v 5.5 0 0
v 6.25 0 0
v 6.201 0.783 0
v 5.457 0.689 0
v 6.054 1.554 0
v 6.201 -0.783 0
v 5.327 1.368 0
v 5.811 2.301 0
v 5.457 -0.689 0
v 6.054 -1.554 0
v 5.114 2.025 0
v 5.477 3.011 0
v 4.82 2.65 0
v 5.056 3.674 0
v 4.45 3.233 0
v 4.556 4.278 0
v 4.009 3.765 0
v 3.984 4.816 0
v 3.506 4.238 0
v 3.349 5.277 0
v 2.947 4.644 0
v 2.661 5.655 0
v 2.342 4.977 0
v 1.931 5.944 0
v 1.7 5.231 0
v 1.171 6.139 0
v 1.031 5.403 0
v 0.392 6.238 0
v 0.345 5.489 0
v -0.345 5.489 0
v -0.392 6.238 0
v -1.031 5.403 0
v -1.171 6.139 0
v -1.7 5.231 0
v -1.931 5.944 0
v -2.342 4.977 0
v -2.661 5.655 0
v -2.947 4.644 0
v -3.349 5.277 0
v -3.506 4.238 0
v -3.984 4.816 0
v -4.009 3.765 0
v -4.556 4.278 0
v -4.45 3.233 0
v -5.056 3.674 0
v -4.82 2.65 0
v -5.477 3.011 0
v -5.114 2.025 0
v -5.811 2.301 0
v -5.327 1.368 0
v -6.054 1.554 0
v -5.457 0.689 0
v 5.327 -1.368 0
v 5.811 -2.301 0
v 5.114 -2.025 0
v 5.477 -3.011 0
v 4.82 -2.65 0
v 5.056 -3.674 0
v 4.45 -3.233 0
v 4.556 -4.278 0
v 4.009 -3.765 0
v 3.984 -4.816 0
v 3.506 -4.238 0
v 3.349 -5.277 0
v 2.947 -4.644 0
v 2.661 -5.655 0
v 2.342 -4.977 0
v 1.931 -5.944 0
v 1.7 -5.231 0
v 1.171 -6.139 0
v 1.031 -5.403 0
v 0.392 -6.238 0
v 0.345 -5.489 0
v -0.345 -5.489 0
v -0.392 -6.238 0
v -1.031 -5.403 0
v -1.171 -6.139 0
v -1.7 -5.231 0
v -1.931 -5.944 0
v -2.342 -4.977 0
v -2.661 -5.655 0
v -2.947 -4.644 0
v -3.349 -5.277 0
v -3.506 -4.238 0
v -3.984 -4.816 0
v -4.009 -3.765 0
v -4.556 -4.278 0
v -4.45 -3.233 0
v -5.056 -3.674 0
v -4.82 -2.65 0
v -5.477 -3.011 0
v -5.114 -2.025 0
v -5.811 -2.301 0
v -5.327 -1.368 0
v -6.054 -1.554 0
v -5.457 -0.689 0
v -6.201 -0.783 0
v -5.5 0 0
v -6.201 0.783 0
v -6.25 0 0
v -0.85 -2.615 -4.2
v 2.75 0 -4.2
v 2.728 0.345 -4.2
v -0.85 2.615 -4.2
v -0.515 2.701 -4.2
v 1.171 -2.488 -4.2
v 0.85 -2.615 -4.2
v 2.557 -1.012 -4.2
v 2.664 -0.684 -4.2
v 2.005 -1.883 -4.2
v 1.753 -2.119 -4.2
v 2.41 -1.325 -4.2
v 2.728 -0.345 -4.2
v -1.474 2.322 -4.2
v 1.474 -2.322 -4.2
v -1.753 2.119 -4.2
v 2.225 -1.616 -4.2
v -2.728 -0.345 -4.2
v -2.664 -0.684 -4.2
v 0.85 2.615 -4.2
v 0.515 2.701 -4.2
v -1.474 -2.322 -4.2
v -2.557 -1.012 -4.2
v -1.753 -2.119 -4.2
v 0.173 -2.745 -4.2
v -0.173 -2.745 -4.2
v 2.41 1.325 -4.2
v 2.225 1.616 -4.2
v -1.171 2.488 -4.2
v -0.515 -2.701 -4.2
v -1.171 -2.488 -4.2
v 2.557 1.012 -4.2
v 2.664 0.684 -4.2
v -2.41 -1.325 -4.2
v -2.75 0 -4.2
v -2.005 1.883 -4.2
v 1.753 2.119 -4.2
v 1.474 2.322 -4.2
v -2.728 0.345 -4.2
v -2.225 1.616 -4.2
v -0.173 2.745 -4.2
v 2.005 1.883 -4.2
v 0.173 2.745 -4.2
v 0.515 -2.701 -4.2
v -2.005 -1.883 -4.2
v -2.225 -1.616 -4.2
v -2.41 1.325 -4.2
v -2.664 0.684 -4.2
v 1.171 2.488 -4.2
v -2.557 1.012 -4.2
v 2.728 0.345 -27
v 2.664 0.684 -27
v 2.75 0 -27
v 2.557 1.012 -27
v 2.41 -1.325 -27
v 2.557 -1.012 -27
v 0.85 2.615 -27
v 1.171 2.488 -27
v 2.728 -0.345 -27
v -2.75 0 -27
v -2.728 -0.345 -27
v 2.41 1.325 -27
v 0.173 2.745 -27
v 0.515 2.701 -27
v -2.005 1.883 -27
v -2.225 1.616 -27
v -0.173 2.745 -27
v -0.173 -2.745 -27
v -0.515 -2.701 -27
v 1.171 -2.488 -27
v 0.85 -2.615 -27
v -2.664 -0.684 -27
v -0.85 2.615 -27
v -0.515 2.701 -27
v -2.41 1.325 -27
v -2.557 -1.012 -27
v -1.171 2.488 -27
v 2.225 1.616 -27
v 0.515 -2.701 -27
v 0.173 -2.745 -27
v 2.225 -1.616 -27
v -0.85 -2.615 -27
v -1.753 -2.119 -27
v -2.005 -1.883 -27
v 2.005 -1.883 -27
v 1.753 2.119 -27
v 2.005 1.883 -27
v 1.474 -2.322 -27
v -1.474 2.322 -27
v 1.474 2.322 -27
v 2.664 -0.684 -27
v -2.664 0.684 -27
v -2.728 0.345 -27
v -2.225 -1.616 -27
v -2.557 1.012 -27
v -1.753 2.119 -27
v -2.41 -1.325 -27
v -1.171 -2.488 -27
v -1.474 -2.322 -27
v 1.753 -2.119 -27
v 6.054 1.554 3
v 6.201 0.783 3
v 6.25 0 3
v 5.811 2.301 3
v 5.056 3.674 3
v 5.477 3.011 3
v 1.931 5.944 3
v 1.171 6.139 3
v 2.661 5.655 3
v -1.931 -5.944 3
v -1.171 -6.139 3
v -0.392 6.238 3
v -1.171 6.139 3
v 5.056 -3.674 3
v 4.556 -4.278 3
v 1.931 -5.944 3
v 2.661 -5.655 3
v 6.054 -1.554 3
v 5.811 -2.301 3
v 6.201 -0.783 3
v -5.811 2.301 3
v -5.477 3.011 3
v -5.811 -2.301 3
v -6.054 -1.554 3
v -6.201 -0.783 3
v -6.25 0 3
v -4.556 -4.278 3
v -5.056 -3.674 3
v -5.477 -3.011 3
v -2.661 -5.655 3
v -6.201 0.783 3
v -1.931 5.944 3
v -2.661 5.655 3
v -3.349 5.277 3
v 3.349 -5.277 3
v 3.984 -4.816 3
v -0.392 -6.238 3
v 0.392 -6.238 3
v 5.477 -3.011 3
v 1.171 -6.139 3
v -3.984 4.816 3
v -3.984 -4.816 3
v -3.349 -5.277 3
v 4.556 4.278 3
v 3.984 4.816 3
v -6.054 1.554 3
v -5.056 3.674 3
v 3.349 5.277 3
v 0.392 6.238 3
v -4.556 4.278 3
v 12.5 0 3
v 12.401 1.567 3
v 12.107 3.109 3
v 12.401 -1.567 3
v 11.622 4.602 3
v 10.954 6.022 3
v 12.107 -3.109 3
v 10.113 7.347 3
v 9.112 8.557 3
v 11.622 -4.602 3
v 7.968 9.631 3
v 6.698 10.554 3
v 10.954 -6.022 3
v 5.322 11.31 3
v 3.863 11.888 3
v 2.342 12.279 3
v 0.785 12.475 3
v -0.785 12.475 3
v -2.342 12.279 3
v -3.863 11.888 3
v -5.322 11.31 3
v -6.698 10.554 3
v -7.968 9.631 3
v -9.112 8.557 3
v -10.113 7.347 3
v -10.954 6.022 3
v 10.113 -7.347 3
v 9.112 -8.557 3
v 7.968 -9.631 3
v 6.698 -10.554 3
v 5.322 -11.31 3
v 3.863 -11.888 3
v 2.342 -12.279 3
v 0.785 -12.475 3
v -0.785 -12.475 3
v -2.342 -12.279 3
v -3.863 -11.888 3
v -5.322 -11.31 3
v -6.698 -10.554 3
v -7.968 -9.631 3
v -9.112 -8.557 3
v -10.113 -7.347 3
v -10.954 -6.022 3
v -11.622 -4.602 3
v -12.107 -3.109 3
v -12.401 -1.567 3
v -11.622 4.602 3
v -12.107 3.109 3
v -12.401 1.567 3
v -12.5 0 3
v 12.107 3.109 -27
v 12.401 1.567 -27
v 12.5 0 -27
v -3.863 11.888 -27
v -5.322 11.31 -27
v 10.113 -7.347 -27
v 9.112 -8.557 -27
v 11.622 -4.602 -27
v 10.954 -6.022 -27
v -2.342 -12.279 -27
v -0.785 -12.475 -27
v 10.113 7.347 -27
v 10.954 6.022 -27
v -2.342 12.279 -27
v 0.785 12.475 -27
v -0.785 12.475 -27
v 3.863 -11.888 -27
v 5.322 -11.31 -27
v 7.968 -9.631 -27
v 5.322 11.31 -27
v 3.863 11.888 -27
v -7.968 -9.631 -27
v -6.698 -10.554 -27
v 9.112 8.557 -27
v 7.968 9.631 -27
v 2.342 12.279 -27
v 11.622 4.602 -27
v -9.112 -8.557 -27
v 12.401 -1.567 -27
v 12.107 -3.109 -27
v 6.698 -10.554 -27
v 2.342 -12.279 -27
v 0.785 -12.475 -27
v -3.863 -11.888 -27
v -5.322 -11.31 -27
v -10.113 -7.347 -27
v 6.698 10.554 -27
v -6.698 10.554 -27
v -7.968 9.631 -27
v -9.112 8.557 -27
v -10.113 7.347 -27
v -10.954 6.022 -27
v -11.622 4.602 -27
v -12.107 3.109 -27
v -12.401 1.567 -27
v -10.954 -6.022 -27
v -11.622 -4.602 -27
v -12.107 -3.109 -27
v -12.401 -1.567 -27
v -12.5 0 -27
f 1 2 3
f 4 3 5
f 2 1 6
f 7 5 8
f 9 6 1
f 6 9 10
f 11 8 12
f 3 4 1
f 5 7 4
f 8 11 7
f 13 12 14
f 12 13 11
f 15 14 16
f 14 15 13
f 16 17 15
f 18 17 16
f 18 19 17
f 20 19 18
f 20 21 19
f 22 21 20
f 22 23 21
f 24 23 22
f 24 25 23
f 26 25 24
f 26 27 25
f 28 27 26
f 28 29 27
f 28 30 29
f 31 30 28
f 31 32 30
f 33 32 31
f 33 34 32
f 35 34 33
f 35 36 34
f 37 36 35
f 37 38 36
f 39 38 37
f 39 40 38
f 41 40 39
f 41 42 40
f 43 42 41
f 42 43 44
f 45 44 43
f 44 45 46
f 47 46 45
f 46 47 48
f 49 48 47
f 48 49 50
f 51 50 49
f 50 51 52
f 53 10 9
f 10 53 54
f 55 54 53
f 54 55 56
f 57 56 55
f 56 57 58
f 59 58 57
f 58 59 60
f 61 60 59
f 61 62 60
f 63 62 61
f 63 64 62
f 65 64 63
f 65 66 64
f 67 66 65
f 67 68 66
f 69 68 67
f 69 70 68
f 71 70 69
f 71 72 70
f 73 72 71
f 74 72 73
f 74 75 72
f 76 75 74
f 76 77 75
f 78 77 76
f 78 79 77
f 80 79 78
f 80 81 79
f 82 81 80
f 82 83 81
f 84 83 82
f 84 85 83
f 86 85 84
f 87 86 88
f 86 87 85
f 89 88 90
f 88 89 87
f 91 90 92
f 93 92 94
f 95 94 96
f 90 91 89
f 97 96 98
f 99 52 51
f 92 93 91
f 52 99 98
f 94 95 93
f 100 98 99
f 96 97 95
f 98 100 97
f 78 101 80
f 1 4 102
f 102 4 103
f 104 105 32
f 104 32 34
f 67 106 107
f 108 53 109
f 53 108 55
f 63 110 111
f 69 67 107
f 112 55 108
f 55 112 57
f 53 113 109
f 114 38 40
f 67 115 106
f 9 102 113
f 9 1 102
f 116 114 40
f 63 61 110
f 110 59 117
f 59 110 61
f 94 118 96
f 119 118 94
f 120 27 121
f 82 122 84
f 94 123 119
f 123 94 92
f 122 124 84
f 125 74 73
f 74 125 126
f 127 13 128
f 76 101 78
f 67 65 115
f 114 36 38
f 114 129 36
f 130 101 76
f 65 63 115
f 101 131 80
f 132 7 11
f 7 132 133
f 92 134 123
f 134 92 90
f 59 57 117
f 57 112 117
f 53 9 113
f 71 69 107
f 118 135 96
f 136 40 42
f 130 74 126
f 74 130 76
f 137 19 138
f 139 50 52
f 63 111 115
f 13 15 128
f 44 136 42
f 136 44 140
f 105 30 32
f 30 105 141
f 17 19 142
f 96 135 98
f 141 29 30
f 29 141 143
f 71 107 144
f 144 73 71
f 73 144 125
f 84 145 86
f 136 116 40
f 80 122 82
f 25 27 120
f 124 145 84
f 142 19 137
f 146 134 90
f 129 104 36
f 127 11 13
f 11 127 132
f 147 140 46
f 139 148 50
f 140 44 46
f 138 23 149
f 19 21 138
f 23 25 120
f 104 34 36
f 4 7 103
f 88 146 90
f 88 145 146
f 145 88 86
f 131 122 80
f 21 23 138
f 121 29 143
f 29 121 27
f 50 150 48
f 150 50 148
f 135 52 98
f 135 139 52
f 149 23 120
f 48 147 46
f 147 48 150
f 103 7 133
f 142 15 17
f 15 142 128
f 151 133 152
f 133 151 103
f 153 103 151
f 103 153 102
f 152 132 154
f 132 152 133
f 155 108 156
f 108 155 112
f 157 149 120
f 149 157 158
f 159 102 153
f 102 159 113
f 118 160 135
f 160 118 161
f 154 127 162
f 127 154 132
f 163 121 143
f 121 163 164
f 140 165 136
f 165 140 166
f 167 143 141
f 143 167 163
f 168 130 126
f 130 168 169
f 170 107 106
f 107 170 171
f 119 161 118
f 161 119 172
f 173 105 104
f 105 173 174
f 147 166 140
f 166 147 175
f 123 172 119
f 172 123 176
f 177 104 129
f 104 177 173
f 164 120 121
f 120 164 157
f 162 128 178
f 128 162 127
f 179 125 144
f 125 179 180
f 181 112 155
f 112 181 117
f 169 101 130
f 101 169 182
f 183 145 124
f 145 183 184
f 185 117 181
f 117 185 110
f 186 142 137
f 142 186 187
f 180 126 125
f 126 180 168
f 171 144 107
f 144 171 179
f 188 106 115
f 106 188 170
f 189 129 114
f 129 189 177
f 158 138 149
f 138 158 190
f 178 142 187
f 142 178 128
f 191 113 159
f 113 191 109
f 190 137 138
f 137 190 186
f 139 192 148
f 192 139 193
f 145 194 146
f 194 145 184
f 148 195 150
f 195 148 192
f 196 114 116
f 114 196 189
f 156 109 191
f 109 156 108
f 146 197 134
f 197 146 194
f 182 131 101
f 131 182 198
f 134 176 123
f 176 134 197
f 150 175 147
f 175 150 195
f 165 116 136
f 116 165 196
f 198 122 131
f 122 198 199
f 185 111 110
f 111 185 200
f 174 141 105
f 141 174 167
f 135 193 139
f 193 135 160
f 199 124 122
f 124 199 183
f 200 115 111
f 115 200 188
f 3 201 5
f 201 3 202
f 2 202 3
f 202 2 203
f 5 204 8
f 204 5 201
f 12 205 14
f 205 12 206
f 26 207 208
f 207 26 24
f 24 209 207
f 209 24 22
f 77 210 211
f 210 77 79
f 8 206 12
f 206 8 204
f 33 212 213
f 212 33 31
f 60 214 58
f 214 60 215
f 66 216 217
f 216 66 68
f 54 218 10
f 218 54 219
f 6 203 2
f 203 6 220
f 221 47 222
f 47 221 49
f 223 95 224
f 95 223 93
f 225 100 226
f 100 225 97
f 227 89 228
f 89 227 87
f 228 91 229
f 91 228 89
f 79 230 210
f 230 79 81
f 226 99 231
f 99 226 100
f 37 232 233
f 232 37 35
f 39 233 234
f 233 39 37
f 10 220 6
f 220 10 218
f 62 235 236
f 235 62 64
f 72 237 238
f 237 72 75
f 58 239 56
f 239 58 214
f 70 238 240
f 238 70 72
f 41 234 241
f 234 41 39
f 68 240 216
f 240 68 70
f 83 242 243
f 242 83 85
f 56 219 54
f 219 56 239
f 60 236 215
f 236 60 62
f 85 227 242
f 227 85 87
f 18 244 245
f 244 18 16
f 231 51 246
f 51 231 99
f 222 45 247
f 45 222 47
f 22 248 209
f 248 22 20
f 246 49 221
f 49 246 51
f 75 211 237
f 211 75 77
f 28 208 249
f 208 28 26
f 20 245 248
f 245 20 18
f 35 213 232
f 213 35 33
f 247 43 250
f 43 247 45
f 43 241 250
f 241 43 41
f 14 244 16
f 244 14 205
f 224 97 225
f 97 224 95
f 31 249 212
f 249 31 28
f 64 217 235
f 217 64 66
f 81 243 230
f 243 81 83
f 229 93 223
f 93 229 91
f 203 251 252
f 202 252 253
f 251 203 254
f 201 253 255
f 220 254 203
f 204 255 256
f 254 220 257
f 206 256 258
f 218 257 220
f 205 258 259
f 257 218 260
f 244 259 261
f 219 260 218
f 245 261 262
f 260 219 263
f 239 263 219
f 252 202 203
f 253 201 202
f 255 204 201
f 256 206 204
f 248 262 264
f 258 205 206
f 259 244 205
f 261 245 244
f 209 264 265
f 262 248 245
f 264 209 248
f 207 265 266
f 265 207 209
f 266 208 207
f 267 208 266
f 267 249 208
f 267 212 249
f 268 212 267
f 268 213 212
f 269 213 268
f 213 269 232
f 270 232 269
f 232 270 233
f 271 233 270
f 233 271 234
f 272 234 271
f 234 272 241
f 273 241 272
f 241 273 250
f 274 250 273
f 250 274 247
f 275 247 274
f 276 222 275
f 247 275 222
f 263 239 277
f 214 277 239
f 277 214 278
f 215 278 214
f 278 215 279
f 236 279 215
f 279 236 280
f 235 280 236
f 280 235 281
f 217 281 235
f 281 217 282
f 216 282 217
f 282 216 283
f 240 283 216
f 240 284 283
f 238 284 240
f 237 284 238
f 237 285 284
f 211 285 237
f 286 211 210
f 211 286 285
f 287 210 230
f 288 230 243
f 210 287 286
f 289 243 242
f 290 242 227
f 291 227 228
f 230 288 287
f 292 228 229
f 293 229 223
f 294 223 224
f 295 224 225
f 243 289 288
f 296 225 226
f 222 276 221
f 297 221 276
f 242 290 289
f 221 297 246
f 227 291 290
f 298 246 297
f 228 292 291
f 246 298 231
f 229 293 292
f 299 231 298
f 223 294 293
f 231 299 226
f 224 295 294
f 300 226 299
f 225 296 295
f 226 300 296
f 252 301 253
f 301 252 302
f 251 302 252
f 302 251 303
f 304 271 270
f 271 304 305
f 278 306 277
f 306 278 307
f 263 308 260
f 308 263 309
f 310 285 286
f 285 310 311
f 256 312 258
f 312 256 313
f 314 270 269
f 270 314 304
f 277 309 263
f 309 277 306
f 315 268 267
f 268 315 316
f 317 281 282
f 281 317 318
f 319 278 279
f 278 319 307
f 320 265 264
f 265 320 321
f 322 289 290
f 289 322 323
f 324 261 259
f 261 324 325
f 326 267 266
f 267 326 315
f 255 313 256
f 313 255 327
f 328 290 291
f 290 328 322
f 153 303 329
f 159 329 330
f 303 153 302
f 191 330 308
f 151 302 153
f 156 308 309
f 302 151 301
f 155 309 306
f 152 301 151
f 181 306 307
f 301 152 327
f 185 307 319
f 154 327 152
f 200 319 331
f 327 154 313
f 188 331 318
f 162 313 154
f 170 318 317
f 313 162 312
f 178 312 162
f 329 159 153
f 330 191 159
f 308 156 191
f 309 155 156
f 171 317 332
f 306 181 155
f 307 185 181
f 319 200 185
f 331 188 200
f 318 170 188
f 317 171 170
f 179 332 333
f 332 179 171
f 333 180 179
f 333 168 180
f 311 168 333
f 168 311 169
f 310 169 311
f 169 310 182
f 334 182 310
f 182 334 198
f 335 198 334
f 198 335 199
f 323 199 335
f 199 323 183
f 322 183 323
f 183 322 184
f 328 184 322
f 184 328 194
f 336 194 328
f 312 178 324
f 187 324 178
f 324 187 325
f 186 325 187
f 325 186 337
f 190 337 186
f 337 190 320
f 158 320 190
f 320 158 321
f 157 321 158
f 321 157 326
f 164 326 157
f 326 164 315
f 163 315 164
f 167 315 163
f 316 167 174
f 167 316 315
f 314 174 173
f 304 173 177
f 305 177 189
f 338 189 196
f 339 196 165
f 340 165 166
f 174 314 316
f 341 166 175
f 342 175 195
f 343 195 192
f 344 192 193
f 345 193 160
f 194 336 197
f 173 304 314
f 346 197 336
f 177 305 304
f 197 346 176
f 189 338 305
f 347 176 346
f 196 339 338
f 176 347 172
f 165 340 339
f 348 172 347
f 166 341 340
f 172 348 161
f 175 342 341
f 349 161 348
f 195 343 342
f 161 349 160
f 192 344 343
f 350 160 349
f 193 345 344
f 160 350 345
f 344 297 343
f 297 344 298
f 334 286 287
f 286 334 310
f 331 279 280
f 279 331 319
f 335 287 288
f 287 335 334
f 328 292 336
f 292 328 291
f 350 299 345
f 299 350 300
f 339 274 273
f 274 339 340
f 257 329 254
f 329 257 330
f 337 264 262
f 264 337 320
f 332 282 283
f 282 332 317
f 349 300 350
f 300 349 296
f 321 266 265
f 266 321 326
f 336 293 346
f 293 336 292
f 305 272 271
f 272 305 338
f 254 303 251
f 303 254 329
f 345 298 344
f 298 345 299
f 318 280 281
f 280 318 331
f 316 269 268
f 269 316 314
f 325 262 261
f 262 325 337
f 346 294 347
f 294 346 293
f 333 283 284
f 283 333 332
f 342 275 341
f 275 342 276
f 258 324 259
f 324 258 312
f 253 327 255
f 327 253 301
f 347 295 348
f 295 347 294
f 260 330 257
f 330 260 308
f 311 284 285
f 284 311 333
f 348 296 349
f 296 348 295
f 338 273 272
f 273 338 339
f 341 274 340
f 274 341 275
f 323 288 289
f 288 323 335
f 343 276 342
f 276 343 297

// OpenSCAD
$fn = 50;

difference() {
	union() {
		translate(v = [0, 0, -27.0]) {
			cylinder(h = 30, r = 12.5);
		}
	}
	union() {
		translate(v = [0, 0, 0]) {
			rotate(a = [0, 0, 0]) {
				difference() {
					union() {
						translate(v = [0, 0, -30.0]) {
							cylinder(h = 30, r = 2.25);
						}
						translate(v = [0, 0, -4.2]) {
							cylinder(h = 4.2, r1 = 2.75, r2 = 5.5);
						}
						translate(v = [0, 0, -30.0]) {
							cylinder(h = 30, r = 2.75);
						}
						translate(v = [0, 0, -30.0]) {
							cylinder(h = 30, r = 2.25);
						}
					}
					union();
				}
			}
		}
		#cylinder(h = 3, r = 6.25);
	}
}
